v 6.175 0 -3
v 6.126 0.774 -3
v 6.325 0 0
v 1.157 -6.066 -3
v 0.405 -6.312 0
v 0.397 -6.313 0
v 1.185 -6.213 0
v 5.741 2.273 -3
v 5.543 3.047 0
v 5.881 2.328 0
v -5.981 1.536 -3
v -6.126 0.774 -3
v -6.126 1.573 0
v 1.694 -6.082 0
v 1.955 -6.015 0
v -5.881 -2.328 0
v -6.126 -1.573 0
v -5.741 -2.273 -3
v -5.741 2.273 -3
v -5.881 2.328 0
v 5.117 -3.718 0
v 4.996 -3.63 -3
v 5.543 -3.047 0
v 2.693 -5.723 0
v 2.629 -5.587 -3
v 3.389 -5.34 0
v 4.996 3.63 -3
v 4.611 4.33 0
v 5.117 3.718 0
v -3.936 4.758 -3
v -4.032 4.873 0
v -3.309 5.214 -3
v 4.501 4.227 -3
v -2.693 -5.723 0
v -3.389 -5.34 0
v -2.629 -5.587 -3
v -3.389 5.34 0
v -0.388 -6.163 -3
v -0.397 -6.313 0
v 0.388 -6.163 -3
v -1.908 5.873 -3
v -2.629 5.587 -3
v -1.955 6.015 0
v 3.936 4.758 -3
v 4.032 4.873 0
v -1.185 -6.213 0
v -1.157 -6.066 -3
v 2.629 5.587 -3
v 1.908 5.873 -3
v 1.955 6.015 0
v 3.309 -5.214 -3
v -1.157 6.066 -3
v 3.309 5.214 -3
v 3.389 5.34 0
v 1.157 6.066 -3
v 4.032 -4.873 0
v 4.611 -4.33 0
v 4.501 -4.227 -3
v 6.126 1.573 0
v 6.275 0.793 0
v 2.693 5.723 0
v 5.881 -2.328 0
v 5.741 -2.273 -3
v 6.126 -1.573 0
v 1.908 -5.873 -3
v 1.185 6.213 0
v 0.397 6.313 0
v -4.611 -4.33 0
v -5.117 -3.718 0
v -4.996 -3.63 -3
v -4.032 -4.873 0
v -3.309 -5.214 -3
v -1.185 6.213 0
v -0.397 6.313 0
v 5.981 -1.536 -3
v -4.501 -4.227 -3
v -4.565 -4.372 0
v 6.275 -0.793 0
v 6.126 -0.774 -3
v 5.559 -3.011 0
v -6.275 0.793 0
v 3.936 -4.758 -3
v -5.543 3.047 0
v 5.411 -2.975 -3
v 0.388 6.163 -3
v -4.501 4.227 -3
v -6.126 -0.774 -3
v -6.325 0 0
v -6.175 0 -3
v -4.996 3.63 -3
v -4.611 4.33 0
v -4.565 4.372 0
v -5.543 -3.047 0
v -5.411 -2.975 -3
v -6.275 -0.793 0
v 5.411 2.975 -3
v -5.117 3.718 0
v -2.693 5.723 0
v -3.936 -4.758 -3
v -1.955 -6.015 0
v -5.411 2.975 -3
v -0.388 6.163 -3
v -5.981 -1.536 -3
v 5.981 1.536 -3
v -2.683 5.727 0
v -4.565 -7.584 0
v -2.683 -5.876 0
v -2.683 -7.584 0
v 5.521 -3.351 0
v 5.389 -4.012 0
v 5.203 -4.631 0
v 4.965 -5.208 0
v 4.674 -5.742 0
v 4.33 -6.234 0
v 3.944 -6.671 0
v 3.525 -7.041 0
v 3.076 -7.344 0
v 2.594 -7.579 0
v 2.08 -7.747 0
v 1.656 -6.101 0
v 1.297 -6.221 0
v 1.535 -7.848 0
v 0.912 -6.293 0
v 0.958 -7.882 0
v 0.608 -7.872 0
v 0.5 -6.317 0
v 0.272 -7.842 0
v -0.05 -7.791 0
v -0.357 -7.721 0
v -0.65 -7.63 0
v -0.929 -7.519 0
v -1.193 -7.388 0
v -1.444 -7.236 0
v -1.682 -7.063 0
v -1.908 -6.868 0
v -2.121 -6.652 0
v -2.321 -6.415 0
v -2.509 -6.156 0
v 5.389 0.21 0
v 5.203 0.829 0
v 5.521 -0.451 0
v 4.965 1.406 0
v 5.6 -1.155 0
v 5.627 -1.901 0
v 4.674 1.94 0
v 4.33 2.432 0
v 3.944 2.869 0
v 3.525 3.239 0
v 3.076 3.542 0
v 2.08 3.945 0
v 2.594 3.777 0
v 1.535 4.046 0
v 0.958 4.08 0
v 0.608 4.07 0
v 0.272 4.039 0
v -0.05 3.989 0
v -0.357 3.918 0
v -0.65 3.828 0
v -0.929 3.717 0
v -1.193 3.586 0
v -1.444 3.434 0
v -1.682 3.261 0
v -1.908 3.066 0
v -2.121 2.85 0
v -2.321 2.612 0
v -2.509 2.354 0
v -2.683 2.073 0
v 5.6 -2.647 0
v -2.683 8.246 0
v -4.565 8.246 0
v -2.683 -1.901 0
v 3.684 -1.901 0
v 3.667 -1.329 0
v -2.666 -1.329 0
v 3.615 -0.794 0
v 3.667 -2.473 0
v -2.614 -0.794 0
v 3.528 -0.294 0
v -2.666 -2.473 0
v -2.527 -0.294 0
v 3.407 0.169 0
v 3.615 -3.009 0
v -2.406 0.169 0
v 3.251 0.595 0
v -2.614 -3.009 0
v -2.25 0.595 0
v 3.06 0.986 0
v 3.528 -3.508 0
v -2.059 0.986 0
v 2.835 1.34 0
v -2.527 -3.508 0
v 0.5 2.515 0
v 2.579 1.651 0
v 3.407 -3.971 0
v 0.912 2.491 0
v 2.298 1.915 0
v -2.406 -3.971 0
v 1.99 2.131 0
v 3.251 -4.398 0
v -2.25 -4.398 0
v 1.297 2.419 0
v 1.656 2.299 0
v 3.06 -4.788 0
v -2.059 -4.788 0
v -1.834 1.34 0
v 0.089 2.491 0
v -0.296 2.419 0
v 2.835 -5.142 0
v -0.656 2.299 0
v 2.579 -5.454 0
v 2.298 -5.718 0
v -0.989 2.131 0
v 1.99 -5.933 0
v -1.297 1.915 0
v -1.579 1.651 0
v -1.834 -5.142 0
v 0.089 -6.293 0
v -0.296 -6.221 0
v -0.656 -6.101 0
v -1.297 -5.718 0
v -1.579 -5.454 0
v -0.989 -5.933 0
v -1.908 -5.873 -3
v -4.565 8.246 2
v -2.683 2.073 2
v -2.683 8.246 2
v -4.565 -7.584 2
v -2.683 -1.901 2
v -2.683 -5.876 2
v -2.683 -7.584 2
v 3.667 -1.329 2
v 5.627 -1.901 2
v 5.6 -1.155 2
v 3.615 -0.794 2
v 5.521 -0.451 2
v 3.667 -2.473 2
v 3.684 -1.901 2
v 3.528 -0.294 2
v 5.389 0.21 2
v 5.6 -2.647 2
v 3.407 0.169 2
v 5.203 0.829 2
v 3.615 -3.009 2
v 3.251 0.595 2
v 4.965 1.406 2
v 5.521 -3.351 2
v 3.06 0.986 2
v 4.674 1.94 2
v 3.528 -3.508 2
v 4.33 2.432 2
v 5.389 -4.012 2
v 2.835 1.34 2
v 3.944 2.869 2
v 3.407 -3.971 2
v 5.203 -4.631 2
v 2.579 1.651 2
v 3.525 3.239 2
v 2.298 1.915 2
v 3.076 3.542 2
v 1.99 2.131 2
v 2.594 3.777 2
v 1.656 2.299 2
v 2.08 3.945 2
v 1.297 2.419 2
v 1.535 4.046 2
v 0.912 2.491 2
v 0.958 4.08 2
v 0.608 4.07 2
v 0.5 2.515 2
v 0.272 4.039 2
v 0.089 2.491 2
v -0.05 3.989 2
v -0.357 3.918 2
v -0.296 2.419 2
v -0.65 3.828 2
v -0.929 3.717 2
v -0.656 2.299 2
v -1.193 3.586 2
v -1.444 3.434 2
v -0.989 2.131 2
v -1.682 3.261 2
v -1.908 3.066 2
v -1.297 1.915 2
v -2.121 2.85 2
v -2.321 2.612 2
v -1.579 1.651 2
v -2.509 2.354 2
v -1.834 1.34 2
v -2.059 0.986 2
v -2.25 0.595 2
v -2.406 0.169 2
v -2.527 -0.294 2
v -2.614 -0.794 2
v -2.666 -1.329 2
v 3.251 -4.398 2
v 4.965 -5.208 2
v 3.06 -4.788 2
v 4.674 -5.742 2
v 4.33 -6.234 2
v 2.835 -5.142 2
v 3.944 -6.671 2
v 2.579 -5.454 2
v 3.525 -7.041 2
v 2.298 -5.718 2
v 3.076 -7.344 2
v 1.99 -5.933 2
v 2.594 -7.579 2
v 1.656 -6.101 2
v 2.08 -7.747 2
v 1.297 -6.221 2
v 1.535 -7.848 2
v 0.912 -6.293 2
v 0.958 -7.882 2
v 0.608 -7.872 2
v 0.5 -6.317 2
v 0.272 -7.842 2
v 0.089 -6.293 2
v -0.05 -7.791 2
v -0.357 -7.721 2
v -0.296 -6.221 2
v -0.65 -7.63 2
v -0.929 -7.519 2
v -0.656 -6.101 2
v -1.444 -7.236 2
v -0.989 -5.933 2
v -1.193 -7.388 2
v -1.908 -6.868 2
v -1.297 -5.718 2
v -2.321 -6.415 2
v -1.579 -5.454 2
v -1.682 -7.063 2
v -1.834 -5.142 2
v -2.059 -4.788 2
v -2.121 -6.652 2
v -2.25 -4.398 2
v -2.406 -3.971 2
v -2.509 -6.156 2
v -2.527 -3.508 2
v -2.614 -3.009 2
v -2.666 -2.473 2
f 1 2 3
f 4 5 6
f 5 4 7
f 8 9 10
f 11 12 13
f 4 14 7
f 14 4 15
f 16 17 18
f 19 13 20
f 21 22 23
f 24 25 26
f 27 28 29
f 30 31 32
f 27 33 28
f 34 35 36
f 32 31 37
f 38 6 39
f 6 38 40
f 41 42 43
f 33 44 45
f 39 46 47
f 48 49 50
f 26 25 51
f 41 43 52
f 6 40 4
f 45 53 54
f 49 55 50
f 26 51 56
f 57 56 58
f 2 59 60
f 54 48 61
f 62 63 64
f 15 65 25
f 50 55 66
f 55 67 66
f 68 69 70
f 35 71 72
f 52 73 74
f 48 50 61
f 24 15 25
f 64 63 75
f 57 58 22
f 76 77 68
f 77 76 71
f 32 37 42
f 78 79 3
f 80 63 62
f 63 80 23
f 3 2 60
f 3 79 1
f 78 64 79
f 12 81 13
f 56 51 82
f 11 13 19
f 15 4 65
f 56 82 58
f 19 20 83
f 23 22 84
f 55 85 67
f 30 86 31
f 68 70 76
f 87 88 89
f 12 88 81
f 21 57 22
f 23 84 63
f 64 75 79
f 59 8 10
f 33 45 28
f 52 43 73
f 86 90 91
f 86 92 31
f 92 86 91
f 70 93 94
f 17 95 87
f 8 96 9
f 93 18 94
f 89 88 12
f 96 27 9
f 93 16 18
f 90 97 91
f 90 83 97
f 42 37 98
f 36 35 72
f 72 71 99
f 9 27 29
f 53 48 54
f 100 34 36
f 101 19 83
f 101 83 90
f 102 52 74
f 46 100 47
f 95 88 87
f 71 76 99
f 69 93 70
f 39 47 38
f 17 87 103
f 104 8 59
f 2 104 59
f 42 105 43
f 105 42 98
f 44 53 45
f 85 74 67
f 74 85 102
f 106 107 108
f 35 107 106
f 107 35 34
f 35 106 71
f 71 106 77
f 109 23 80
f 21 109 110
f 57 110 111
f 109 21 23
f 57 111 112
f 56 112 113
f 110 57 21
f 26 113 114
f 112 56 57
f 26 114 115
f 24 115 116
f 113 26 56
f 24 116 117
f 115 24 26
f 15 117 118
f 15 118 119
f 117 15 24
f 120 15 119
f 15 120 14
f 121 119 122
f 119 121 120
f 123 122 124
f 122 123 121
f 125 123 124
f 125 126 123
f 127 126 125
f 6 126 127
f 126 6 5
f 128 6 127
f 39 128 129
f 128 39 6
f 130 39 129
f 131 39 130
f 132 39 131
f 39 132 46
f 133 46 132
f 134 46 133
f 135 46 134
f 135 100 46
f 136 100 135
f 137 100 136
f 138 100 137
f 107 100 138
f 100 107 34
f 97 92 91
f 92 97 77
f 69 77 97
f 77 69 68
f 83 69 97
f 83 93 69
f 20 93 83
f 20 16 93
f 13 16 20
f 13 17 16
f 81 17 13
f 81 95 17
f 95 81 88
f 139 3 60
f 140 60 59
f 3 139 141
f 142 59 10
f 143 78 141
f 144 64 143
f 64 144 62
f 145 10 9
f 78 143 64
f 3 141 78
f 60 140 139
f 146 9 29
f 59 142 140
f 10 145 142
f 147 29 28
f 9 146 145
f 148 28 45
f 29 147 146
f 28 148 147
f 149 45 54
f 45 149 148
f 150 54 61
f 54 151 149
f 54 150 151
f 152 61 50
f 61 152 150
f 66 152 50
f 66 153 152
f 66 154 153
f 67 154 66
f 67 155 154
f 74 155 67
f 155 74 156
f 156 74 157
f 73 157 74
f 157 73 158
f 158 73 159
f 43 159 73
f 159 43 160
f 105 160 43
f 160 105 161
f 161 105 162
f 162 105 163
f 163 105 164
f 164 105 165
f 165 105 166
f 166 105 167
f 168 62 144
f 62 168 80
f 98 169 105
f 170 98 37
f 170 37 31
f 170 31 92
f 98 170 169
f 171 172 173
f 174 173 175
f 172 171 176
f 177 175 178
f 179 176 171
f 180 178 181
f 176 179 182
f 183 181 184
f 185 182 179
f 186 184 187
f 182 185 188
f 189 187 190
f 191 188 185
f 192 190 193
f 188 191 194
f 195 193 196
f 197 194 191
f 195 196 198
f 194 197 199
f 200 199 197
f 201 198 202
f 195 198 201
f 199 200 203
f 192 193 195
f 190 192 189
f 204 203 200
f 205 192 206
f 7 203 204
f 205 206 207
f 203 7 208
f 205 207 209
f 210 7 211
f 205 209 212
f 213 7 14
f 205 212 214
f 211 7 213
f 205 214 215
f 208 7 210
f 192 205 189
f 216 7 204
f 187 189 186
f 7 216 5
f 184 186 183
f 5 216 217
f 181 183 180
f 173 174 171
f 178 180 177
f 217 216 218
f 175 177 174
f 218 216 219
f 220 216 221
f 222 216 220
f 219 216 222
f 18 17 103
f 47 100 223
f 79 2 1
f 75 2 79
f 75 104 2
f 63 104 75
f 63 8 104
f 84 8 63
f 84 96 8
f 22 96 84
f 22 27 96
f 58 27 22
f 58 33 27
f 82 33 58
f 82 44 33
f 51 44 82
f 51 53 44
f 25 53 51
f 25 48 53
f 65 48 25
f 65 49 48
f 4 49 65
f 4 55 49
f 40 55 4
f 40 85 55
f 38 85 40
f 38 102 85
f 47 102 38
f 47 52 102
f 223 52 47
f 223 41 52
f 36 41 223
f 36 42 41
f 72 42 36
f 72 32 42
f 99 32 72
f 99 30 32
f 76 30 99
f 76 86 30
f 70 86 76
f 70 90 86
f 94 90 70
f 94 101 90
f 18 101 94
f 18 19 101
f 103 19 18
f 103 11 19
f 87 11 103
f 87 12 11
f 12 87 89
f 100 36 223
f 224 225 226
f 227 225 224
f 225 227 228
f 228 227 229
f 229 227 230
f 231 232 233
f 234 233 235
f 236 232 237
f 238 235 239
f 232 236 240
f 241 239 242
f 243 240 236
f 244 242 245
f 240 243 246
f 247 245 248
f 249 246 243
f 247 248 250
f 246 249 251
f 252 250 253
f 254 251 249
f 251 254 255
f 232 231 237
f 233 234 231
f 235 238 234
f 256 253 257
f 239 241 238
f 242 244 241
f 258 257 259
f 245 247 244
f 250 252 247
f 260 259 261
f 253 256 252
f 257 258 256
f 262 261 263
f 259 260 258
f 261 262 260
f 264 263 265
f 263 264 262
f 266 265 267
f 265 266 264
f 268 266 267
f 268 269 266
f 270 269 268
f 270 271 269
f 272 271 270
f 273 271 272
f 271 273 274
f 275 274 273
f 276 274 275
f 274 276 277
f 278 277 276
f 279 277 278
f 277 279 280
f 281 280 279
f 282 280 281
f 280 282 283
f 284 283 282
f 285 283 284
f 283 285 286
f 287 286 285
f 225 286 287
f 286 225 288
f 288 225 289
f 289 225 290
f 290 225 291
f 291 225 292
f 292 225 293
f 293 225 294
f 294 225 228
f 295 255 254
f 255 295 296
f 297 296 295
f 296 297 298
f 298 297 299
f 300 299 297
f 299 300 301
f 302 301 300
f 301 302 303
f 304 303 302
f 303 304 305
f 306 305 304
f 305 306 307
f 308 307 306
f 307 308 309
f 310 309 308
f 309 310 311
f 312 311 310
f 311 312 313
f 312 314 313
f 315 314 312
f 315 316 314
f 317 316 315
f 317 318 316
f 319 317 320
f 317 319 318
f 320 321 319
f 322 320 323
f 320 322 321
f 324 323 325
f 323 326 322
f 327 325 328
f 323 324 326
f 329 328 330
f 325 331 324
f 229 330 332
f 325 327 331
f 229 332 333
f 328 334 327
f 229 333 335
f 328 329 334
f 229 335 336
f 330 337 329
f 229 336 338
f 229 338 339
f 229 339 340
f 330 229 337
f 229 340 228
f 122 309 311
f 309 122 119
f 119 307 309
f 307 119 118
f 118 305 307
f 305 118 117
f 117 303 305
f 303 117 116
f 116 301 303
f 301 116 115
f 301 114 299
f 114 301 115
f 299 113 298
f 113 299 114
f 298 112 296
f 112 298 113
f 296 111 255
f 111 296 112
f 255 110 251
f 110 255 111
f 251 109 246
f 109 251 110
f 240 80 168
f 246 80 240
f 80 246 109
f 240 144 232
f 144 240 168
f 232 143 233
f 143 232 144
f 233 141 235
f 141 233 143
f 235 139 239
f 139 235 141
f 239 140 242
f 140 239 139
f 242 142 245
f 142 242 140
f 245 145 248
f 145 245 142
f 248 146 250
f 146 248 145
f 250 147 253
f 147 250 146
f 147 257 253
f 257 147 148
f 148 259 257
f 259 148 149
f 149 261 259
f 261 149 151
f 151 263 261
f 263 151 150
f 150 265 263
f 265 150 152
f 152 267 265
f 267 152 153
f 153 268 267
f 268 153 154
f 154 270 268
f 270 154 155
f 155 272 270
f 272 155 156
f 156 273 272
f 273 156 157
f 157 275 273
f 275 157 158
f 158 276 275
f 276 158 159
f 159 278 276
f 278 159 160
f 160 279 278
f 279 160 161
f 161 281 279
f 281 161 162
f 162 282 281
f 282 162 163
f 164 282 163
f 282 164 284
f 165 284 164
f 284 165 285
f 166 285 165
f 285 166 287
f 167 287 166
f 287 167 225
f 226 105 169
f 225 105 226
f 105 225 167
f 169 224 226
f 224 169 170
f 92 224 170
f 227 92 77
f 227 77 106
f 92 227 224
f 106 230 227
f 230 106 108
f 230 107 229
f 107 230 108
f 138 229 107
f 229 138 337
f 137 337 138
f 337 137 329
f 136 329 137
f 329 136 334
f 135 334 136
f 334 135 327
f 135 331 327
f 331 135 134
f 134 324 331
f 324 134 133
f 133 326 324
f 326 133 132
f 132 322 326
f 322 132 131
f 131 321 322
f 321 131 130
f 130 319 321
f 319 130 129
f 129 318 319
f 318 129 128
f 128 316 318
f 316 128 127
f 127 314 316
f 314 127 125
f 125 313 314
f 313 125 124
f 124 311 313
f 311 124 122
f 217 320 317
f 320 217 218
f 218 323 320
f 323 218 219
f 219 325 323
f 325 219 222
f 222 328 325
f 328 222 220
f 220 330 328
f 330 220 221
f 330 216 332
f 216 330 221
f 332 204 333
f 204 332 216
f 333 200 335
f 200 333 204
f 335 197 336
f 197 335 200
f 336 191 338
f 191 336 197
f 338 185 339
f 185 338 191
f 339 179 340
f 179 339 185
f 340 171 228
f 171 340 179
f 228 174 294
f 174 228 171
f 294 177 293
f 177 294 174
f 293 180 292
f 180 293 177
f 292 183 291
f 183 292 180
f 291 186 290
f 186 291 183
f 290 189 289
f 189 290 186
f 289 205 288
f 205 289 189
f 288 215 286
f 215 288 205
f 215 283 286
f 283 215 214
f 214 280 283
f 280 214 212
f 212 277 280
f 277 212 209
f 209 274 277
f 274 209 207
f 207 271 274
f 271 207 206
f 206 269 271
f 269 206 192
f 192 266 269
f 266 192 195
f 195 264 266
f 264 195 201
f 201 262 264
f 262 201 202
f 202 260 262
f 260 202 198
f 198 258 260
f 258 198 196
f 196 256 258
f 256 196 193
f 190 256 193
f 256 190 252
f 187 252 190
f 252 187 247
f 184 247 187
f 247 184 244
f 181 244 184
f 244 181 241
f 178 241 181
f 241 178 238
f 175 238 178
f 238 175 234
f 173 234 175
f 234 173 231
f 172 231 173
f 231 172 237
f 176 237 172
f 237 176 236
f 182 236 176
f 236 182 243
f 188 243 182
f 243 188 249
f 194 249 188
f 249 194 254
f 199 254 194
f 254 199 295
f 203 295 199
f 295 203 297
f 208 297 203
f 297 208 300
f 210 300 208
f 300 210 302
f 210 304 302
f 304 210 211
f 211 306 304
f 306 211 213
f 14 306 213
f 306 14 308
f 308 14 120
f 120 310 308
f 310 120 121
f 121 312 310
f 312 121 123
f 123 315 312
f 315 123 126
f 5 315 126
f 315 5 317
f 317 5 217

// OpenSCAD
$fn = 50;


difference() {
	union() {
		translate(v = [0, 0, -3.0000000000]) {
			cylinder(h = 3, r1 = 6.1750000000, r2 = 6.3250000000);
		}
		linear_extrude(height = 2) {
			text(font = "Webdings", halign = "center", size = 15, text = "b", valign = "center");
		}
	}
	union();
}
